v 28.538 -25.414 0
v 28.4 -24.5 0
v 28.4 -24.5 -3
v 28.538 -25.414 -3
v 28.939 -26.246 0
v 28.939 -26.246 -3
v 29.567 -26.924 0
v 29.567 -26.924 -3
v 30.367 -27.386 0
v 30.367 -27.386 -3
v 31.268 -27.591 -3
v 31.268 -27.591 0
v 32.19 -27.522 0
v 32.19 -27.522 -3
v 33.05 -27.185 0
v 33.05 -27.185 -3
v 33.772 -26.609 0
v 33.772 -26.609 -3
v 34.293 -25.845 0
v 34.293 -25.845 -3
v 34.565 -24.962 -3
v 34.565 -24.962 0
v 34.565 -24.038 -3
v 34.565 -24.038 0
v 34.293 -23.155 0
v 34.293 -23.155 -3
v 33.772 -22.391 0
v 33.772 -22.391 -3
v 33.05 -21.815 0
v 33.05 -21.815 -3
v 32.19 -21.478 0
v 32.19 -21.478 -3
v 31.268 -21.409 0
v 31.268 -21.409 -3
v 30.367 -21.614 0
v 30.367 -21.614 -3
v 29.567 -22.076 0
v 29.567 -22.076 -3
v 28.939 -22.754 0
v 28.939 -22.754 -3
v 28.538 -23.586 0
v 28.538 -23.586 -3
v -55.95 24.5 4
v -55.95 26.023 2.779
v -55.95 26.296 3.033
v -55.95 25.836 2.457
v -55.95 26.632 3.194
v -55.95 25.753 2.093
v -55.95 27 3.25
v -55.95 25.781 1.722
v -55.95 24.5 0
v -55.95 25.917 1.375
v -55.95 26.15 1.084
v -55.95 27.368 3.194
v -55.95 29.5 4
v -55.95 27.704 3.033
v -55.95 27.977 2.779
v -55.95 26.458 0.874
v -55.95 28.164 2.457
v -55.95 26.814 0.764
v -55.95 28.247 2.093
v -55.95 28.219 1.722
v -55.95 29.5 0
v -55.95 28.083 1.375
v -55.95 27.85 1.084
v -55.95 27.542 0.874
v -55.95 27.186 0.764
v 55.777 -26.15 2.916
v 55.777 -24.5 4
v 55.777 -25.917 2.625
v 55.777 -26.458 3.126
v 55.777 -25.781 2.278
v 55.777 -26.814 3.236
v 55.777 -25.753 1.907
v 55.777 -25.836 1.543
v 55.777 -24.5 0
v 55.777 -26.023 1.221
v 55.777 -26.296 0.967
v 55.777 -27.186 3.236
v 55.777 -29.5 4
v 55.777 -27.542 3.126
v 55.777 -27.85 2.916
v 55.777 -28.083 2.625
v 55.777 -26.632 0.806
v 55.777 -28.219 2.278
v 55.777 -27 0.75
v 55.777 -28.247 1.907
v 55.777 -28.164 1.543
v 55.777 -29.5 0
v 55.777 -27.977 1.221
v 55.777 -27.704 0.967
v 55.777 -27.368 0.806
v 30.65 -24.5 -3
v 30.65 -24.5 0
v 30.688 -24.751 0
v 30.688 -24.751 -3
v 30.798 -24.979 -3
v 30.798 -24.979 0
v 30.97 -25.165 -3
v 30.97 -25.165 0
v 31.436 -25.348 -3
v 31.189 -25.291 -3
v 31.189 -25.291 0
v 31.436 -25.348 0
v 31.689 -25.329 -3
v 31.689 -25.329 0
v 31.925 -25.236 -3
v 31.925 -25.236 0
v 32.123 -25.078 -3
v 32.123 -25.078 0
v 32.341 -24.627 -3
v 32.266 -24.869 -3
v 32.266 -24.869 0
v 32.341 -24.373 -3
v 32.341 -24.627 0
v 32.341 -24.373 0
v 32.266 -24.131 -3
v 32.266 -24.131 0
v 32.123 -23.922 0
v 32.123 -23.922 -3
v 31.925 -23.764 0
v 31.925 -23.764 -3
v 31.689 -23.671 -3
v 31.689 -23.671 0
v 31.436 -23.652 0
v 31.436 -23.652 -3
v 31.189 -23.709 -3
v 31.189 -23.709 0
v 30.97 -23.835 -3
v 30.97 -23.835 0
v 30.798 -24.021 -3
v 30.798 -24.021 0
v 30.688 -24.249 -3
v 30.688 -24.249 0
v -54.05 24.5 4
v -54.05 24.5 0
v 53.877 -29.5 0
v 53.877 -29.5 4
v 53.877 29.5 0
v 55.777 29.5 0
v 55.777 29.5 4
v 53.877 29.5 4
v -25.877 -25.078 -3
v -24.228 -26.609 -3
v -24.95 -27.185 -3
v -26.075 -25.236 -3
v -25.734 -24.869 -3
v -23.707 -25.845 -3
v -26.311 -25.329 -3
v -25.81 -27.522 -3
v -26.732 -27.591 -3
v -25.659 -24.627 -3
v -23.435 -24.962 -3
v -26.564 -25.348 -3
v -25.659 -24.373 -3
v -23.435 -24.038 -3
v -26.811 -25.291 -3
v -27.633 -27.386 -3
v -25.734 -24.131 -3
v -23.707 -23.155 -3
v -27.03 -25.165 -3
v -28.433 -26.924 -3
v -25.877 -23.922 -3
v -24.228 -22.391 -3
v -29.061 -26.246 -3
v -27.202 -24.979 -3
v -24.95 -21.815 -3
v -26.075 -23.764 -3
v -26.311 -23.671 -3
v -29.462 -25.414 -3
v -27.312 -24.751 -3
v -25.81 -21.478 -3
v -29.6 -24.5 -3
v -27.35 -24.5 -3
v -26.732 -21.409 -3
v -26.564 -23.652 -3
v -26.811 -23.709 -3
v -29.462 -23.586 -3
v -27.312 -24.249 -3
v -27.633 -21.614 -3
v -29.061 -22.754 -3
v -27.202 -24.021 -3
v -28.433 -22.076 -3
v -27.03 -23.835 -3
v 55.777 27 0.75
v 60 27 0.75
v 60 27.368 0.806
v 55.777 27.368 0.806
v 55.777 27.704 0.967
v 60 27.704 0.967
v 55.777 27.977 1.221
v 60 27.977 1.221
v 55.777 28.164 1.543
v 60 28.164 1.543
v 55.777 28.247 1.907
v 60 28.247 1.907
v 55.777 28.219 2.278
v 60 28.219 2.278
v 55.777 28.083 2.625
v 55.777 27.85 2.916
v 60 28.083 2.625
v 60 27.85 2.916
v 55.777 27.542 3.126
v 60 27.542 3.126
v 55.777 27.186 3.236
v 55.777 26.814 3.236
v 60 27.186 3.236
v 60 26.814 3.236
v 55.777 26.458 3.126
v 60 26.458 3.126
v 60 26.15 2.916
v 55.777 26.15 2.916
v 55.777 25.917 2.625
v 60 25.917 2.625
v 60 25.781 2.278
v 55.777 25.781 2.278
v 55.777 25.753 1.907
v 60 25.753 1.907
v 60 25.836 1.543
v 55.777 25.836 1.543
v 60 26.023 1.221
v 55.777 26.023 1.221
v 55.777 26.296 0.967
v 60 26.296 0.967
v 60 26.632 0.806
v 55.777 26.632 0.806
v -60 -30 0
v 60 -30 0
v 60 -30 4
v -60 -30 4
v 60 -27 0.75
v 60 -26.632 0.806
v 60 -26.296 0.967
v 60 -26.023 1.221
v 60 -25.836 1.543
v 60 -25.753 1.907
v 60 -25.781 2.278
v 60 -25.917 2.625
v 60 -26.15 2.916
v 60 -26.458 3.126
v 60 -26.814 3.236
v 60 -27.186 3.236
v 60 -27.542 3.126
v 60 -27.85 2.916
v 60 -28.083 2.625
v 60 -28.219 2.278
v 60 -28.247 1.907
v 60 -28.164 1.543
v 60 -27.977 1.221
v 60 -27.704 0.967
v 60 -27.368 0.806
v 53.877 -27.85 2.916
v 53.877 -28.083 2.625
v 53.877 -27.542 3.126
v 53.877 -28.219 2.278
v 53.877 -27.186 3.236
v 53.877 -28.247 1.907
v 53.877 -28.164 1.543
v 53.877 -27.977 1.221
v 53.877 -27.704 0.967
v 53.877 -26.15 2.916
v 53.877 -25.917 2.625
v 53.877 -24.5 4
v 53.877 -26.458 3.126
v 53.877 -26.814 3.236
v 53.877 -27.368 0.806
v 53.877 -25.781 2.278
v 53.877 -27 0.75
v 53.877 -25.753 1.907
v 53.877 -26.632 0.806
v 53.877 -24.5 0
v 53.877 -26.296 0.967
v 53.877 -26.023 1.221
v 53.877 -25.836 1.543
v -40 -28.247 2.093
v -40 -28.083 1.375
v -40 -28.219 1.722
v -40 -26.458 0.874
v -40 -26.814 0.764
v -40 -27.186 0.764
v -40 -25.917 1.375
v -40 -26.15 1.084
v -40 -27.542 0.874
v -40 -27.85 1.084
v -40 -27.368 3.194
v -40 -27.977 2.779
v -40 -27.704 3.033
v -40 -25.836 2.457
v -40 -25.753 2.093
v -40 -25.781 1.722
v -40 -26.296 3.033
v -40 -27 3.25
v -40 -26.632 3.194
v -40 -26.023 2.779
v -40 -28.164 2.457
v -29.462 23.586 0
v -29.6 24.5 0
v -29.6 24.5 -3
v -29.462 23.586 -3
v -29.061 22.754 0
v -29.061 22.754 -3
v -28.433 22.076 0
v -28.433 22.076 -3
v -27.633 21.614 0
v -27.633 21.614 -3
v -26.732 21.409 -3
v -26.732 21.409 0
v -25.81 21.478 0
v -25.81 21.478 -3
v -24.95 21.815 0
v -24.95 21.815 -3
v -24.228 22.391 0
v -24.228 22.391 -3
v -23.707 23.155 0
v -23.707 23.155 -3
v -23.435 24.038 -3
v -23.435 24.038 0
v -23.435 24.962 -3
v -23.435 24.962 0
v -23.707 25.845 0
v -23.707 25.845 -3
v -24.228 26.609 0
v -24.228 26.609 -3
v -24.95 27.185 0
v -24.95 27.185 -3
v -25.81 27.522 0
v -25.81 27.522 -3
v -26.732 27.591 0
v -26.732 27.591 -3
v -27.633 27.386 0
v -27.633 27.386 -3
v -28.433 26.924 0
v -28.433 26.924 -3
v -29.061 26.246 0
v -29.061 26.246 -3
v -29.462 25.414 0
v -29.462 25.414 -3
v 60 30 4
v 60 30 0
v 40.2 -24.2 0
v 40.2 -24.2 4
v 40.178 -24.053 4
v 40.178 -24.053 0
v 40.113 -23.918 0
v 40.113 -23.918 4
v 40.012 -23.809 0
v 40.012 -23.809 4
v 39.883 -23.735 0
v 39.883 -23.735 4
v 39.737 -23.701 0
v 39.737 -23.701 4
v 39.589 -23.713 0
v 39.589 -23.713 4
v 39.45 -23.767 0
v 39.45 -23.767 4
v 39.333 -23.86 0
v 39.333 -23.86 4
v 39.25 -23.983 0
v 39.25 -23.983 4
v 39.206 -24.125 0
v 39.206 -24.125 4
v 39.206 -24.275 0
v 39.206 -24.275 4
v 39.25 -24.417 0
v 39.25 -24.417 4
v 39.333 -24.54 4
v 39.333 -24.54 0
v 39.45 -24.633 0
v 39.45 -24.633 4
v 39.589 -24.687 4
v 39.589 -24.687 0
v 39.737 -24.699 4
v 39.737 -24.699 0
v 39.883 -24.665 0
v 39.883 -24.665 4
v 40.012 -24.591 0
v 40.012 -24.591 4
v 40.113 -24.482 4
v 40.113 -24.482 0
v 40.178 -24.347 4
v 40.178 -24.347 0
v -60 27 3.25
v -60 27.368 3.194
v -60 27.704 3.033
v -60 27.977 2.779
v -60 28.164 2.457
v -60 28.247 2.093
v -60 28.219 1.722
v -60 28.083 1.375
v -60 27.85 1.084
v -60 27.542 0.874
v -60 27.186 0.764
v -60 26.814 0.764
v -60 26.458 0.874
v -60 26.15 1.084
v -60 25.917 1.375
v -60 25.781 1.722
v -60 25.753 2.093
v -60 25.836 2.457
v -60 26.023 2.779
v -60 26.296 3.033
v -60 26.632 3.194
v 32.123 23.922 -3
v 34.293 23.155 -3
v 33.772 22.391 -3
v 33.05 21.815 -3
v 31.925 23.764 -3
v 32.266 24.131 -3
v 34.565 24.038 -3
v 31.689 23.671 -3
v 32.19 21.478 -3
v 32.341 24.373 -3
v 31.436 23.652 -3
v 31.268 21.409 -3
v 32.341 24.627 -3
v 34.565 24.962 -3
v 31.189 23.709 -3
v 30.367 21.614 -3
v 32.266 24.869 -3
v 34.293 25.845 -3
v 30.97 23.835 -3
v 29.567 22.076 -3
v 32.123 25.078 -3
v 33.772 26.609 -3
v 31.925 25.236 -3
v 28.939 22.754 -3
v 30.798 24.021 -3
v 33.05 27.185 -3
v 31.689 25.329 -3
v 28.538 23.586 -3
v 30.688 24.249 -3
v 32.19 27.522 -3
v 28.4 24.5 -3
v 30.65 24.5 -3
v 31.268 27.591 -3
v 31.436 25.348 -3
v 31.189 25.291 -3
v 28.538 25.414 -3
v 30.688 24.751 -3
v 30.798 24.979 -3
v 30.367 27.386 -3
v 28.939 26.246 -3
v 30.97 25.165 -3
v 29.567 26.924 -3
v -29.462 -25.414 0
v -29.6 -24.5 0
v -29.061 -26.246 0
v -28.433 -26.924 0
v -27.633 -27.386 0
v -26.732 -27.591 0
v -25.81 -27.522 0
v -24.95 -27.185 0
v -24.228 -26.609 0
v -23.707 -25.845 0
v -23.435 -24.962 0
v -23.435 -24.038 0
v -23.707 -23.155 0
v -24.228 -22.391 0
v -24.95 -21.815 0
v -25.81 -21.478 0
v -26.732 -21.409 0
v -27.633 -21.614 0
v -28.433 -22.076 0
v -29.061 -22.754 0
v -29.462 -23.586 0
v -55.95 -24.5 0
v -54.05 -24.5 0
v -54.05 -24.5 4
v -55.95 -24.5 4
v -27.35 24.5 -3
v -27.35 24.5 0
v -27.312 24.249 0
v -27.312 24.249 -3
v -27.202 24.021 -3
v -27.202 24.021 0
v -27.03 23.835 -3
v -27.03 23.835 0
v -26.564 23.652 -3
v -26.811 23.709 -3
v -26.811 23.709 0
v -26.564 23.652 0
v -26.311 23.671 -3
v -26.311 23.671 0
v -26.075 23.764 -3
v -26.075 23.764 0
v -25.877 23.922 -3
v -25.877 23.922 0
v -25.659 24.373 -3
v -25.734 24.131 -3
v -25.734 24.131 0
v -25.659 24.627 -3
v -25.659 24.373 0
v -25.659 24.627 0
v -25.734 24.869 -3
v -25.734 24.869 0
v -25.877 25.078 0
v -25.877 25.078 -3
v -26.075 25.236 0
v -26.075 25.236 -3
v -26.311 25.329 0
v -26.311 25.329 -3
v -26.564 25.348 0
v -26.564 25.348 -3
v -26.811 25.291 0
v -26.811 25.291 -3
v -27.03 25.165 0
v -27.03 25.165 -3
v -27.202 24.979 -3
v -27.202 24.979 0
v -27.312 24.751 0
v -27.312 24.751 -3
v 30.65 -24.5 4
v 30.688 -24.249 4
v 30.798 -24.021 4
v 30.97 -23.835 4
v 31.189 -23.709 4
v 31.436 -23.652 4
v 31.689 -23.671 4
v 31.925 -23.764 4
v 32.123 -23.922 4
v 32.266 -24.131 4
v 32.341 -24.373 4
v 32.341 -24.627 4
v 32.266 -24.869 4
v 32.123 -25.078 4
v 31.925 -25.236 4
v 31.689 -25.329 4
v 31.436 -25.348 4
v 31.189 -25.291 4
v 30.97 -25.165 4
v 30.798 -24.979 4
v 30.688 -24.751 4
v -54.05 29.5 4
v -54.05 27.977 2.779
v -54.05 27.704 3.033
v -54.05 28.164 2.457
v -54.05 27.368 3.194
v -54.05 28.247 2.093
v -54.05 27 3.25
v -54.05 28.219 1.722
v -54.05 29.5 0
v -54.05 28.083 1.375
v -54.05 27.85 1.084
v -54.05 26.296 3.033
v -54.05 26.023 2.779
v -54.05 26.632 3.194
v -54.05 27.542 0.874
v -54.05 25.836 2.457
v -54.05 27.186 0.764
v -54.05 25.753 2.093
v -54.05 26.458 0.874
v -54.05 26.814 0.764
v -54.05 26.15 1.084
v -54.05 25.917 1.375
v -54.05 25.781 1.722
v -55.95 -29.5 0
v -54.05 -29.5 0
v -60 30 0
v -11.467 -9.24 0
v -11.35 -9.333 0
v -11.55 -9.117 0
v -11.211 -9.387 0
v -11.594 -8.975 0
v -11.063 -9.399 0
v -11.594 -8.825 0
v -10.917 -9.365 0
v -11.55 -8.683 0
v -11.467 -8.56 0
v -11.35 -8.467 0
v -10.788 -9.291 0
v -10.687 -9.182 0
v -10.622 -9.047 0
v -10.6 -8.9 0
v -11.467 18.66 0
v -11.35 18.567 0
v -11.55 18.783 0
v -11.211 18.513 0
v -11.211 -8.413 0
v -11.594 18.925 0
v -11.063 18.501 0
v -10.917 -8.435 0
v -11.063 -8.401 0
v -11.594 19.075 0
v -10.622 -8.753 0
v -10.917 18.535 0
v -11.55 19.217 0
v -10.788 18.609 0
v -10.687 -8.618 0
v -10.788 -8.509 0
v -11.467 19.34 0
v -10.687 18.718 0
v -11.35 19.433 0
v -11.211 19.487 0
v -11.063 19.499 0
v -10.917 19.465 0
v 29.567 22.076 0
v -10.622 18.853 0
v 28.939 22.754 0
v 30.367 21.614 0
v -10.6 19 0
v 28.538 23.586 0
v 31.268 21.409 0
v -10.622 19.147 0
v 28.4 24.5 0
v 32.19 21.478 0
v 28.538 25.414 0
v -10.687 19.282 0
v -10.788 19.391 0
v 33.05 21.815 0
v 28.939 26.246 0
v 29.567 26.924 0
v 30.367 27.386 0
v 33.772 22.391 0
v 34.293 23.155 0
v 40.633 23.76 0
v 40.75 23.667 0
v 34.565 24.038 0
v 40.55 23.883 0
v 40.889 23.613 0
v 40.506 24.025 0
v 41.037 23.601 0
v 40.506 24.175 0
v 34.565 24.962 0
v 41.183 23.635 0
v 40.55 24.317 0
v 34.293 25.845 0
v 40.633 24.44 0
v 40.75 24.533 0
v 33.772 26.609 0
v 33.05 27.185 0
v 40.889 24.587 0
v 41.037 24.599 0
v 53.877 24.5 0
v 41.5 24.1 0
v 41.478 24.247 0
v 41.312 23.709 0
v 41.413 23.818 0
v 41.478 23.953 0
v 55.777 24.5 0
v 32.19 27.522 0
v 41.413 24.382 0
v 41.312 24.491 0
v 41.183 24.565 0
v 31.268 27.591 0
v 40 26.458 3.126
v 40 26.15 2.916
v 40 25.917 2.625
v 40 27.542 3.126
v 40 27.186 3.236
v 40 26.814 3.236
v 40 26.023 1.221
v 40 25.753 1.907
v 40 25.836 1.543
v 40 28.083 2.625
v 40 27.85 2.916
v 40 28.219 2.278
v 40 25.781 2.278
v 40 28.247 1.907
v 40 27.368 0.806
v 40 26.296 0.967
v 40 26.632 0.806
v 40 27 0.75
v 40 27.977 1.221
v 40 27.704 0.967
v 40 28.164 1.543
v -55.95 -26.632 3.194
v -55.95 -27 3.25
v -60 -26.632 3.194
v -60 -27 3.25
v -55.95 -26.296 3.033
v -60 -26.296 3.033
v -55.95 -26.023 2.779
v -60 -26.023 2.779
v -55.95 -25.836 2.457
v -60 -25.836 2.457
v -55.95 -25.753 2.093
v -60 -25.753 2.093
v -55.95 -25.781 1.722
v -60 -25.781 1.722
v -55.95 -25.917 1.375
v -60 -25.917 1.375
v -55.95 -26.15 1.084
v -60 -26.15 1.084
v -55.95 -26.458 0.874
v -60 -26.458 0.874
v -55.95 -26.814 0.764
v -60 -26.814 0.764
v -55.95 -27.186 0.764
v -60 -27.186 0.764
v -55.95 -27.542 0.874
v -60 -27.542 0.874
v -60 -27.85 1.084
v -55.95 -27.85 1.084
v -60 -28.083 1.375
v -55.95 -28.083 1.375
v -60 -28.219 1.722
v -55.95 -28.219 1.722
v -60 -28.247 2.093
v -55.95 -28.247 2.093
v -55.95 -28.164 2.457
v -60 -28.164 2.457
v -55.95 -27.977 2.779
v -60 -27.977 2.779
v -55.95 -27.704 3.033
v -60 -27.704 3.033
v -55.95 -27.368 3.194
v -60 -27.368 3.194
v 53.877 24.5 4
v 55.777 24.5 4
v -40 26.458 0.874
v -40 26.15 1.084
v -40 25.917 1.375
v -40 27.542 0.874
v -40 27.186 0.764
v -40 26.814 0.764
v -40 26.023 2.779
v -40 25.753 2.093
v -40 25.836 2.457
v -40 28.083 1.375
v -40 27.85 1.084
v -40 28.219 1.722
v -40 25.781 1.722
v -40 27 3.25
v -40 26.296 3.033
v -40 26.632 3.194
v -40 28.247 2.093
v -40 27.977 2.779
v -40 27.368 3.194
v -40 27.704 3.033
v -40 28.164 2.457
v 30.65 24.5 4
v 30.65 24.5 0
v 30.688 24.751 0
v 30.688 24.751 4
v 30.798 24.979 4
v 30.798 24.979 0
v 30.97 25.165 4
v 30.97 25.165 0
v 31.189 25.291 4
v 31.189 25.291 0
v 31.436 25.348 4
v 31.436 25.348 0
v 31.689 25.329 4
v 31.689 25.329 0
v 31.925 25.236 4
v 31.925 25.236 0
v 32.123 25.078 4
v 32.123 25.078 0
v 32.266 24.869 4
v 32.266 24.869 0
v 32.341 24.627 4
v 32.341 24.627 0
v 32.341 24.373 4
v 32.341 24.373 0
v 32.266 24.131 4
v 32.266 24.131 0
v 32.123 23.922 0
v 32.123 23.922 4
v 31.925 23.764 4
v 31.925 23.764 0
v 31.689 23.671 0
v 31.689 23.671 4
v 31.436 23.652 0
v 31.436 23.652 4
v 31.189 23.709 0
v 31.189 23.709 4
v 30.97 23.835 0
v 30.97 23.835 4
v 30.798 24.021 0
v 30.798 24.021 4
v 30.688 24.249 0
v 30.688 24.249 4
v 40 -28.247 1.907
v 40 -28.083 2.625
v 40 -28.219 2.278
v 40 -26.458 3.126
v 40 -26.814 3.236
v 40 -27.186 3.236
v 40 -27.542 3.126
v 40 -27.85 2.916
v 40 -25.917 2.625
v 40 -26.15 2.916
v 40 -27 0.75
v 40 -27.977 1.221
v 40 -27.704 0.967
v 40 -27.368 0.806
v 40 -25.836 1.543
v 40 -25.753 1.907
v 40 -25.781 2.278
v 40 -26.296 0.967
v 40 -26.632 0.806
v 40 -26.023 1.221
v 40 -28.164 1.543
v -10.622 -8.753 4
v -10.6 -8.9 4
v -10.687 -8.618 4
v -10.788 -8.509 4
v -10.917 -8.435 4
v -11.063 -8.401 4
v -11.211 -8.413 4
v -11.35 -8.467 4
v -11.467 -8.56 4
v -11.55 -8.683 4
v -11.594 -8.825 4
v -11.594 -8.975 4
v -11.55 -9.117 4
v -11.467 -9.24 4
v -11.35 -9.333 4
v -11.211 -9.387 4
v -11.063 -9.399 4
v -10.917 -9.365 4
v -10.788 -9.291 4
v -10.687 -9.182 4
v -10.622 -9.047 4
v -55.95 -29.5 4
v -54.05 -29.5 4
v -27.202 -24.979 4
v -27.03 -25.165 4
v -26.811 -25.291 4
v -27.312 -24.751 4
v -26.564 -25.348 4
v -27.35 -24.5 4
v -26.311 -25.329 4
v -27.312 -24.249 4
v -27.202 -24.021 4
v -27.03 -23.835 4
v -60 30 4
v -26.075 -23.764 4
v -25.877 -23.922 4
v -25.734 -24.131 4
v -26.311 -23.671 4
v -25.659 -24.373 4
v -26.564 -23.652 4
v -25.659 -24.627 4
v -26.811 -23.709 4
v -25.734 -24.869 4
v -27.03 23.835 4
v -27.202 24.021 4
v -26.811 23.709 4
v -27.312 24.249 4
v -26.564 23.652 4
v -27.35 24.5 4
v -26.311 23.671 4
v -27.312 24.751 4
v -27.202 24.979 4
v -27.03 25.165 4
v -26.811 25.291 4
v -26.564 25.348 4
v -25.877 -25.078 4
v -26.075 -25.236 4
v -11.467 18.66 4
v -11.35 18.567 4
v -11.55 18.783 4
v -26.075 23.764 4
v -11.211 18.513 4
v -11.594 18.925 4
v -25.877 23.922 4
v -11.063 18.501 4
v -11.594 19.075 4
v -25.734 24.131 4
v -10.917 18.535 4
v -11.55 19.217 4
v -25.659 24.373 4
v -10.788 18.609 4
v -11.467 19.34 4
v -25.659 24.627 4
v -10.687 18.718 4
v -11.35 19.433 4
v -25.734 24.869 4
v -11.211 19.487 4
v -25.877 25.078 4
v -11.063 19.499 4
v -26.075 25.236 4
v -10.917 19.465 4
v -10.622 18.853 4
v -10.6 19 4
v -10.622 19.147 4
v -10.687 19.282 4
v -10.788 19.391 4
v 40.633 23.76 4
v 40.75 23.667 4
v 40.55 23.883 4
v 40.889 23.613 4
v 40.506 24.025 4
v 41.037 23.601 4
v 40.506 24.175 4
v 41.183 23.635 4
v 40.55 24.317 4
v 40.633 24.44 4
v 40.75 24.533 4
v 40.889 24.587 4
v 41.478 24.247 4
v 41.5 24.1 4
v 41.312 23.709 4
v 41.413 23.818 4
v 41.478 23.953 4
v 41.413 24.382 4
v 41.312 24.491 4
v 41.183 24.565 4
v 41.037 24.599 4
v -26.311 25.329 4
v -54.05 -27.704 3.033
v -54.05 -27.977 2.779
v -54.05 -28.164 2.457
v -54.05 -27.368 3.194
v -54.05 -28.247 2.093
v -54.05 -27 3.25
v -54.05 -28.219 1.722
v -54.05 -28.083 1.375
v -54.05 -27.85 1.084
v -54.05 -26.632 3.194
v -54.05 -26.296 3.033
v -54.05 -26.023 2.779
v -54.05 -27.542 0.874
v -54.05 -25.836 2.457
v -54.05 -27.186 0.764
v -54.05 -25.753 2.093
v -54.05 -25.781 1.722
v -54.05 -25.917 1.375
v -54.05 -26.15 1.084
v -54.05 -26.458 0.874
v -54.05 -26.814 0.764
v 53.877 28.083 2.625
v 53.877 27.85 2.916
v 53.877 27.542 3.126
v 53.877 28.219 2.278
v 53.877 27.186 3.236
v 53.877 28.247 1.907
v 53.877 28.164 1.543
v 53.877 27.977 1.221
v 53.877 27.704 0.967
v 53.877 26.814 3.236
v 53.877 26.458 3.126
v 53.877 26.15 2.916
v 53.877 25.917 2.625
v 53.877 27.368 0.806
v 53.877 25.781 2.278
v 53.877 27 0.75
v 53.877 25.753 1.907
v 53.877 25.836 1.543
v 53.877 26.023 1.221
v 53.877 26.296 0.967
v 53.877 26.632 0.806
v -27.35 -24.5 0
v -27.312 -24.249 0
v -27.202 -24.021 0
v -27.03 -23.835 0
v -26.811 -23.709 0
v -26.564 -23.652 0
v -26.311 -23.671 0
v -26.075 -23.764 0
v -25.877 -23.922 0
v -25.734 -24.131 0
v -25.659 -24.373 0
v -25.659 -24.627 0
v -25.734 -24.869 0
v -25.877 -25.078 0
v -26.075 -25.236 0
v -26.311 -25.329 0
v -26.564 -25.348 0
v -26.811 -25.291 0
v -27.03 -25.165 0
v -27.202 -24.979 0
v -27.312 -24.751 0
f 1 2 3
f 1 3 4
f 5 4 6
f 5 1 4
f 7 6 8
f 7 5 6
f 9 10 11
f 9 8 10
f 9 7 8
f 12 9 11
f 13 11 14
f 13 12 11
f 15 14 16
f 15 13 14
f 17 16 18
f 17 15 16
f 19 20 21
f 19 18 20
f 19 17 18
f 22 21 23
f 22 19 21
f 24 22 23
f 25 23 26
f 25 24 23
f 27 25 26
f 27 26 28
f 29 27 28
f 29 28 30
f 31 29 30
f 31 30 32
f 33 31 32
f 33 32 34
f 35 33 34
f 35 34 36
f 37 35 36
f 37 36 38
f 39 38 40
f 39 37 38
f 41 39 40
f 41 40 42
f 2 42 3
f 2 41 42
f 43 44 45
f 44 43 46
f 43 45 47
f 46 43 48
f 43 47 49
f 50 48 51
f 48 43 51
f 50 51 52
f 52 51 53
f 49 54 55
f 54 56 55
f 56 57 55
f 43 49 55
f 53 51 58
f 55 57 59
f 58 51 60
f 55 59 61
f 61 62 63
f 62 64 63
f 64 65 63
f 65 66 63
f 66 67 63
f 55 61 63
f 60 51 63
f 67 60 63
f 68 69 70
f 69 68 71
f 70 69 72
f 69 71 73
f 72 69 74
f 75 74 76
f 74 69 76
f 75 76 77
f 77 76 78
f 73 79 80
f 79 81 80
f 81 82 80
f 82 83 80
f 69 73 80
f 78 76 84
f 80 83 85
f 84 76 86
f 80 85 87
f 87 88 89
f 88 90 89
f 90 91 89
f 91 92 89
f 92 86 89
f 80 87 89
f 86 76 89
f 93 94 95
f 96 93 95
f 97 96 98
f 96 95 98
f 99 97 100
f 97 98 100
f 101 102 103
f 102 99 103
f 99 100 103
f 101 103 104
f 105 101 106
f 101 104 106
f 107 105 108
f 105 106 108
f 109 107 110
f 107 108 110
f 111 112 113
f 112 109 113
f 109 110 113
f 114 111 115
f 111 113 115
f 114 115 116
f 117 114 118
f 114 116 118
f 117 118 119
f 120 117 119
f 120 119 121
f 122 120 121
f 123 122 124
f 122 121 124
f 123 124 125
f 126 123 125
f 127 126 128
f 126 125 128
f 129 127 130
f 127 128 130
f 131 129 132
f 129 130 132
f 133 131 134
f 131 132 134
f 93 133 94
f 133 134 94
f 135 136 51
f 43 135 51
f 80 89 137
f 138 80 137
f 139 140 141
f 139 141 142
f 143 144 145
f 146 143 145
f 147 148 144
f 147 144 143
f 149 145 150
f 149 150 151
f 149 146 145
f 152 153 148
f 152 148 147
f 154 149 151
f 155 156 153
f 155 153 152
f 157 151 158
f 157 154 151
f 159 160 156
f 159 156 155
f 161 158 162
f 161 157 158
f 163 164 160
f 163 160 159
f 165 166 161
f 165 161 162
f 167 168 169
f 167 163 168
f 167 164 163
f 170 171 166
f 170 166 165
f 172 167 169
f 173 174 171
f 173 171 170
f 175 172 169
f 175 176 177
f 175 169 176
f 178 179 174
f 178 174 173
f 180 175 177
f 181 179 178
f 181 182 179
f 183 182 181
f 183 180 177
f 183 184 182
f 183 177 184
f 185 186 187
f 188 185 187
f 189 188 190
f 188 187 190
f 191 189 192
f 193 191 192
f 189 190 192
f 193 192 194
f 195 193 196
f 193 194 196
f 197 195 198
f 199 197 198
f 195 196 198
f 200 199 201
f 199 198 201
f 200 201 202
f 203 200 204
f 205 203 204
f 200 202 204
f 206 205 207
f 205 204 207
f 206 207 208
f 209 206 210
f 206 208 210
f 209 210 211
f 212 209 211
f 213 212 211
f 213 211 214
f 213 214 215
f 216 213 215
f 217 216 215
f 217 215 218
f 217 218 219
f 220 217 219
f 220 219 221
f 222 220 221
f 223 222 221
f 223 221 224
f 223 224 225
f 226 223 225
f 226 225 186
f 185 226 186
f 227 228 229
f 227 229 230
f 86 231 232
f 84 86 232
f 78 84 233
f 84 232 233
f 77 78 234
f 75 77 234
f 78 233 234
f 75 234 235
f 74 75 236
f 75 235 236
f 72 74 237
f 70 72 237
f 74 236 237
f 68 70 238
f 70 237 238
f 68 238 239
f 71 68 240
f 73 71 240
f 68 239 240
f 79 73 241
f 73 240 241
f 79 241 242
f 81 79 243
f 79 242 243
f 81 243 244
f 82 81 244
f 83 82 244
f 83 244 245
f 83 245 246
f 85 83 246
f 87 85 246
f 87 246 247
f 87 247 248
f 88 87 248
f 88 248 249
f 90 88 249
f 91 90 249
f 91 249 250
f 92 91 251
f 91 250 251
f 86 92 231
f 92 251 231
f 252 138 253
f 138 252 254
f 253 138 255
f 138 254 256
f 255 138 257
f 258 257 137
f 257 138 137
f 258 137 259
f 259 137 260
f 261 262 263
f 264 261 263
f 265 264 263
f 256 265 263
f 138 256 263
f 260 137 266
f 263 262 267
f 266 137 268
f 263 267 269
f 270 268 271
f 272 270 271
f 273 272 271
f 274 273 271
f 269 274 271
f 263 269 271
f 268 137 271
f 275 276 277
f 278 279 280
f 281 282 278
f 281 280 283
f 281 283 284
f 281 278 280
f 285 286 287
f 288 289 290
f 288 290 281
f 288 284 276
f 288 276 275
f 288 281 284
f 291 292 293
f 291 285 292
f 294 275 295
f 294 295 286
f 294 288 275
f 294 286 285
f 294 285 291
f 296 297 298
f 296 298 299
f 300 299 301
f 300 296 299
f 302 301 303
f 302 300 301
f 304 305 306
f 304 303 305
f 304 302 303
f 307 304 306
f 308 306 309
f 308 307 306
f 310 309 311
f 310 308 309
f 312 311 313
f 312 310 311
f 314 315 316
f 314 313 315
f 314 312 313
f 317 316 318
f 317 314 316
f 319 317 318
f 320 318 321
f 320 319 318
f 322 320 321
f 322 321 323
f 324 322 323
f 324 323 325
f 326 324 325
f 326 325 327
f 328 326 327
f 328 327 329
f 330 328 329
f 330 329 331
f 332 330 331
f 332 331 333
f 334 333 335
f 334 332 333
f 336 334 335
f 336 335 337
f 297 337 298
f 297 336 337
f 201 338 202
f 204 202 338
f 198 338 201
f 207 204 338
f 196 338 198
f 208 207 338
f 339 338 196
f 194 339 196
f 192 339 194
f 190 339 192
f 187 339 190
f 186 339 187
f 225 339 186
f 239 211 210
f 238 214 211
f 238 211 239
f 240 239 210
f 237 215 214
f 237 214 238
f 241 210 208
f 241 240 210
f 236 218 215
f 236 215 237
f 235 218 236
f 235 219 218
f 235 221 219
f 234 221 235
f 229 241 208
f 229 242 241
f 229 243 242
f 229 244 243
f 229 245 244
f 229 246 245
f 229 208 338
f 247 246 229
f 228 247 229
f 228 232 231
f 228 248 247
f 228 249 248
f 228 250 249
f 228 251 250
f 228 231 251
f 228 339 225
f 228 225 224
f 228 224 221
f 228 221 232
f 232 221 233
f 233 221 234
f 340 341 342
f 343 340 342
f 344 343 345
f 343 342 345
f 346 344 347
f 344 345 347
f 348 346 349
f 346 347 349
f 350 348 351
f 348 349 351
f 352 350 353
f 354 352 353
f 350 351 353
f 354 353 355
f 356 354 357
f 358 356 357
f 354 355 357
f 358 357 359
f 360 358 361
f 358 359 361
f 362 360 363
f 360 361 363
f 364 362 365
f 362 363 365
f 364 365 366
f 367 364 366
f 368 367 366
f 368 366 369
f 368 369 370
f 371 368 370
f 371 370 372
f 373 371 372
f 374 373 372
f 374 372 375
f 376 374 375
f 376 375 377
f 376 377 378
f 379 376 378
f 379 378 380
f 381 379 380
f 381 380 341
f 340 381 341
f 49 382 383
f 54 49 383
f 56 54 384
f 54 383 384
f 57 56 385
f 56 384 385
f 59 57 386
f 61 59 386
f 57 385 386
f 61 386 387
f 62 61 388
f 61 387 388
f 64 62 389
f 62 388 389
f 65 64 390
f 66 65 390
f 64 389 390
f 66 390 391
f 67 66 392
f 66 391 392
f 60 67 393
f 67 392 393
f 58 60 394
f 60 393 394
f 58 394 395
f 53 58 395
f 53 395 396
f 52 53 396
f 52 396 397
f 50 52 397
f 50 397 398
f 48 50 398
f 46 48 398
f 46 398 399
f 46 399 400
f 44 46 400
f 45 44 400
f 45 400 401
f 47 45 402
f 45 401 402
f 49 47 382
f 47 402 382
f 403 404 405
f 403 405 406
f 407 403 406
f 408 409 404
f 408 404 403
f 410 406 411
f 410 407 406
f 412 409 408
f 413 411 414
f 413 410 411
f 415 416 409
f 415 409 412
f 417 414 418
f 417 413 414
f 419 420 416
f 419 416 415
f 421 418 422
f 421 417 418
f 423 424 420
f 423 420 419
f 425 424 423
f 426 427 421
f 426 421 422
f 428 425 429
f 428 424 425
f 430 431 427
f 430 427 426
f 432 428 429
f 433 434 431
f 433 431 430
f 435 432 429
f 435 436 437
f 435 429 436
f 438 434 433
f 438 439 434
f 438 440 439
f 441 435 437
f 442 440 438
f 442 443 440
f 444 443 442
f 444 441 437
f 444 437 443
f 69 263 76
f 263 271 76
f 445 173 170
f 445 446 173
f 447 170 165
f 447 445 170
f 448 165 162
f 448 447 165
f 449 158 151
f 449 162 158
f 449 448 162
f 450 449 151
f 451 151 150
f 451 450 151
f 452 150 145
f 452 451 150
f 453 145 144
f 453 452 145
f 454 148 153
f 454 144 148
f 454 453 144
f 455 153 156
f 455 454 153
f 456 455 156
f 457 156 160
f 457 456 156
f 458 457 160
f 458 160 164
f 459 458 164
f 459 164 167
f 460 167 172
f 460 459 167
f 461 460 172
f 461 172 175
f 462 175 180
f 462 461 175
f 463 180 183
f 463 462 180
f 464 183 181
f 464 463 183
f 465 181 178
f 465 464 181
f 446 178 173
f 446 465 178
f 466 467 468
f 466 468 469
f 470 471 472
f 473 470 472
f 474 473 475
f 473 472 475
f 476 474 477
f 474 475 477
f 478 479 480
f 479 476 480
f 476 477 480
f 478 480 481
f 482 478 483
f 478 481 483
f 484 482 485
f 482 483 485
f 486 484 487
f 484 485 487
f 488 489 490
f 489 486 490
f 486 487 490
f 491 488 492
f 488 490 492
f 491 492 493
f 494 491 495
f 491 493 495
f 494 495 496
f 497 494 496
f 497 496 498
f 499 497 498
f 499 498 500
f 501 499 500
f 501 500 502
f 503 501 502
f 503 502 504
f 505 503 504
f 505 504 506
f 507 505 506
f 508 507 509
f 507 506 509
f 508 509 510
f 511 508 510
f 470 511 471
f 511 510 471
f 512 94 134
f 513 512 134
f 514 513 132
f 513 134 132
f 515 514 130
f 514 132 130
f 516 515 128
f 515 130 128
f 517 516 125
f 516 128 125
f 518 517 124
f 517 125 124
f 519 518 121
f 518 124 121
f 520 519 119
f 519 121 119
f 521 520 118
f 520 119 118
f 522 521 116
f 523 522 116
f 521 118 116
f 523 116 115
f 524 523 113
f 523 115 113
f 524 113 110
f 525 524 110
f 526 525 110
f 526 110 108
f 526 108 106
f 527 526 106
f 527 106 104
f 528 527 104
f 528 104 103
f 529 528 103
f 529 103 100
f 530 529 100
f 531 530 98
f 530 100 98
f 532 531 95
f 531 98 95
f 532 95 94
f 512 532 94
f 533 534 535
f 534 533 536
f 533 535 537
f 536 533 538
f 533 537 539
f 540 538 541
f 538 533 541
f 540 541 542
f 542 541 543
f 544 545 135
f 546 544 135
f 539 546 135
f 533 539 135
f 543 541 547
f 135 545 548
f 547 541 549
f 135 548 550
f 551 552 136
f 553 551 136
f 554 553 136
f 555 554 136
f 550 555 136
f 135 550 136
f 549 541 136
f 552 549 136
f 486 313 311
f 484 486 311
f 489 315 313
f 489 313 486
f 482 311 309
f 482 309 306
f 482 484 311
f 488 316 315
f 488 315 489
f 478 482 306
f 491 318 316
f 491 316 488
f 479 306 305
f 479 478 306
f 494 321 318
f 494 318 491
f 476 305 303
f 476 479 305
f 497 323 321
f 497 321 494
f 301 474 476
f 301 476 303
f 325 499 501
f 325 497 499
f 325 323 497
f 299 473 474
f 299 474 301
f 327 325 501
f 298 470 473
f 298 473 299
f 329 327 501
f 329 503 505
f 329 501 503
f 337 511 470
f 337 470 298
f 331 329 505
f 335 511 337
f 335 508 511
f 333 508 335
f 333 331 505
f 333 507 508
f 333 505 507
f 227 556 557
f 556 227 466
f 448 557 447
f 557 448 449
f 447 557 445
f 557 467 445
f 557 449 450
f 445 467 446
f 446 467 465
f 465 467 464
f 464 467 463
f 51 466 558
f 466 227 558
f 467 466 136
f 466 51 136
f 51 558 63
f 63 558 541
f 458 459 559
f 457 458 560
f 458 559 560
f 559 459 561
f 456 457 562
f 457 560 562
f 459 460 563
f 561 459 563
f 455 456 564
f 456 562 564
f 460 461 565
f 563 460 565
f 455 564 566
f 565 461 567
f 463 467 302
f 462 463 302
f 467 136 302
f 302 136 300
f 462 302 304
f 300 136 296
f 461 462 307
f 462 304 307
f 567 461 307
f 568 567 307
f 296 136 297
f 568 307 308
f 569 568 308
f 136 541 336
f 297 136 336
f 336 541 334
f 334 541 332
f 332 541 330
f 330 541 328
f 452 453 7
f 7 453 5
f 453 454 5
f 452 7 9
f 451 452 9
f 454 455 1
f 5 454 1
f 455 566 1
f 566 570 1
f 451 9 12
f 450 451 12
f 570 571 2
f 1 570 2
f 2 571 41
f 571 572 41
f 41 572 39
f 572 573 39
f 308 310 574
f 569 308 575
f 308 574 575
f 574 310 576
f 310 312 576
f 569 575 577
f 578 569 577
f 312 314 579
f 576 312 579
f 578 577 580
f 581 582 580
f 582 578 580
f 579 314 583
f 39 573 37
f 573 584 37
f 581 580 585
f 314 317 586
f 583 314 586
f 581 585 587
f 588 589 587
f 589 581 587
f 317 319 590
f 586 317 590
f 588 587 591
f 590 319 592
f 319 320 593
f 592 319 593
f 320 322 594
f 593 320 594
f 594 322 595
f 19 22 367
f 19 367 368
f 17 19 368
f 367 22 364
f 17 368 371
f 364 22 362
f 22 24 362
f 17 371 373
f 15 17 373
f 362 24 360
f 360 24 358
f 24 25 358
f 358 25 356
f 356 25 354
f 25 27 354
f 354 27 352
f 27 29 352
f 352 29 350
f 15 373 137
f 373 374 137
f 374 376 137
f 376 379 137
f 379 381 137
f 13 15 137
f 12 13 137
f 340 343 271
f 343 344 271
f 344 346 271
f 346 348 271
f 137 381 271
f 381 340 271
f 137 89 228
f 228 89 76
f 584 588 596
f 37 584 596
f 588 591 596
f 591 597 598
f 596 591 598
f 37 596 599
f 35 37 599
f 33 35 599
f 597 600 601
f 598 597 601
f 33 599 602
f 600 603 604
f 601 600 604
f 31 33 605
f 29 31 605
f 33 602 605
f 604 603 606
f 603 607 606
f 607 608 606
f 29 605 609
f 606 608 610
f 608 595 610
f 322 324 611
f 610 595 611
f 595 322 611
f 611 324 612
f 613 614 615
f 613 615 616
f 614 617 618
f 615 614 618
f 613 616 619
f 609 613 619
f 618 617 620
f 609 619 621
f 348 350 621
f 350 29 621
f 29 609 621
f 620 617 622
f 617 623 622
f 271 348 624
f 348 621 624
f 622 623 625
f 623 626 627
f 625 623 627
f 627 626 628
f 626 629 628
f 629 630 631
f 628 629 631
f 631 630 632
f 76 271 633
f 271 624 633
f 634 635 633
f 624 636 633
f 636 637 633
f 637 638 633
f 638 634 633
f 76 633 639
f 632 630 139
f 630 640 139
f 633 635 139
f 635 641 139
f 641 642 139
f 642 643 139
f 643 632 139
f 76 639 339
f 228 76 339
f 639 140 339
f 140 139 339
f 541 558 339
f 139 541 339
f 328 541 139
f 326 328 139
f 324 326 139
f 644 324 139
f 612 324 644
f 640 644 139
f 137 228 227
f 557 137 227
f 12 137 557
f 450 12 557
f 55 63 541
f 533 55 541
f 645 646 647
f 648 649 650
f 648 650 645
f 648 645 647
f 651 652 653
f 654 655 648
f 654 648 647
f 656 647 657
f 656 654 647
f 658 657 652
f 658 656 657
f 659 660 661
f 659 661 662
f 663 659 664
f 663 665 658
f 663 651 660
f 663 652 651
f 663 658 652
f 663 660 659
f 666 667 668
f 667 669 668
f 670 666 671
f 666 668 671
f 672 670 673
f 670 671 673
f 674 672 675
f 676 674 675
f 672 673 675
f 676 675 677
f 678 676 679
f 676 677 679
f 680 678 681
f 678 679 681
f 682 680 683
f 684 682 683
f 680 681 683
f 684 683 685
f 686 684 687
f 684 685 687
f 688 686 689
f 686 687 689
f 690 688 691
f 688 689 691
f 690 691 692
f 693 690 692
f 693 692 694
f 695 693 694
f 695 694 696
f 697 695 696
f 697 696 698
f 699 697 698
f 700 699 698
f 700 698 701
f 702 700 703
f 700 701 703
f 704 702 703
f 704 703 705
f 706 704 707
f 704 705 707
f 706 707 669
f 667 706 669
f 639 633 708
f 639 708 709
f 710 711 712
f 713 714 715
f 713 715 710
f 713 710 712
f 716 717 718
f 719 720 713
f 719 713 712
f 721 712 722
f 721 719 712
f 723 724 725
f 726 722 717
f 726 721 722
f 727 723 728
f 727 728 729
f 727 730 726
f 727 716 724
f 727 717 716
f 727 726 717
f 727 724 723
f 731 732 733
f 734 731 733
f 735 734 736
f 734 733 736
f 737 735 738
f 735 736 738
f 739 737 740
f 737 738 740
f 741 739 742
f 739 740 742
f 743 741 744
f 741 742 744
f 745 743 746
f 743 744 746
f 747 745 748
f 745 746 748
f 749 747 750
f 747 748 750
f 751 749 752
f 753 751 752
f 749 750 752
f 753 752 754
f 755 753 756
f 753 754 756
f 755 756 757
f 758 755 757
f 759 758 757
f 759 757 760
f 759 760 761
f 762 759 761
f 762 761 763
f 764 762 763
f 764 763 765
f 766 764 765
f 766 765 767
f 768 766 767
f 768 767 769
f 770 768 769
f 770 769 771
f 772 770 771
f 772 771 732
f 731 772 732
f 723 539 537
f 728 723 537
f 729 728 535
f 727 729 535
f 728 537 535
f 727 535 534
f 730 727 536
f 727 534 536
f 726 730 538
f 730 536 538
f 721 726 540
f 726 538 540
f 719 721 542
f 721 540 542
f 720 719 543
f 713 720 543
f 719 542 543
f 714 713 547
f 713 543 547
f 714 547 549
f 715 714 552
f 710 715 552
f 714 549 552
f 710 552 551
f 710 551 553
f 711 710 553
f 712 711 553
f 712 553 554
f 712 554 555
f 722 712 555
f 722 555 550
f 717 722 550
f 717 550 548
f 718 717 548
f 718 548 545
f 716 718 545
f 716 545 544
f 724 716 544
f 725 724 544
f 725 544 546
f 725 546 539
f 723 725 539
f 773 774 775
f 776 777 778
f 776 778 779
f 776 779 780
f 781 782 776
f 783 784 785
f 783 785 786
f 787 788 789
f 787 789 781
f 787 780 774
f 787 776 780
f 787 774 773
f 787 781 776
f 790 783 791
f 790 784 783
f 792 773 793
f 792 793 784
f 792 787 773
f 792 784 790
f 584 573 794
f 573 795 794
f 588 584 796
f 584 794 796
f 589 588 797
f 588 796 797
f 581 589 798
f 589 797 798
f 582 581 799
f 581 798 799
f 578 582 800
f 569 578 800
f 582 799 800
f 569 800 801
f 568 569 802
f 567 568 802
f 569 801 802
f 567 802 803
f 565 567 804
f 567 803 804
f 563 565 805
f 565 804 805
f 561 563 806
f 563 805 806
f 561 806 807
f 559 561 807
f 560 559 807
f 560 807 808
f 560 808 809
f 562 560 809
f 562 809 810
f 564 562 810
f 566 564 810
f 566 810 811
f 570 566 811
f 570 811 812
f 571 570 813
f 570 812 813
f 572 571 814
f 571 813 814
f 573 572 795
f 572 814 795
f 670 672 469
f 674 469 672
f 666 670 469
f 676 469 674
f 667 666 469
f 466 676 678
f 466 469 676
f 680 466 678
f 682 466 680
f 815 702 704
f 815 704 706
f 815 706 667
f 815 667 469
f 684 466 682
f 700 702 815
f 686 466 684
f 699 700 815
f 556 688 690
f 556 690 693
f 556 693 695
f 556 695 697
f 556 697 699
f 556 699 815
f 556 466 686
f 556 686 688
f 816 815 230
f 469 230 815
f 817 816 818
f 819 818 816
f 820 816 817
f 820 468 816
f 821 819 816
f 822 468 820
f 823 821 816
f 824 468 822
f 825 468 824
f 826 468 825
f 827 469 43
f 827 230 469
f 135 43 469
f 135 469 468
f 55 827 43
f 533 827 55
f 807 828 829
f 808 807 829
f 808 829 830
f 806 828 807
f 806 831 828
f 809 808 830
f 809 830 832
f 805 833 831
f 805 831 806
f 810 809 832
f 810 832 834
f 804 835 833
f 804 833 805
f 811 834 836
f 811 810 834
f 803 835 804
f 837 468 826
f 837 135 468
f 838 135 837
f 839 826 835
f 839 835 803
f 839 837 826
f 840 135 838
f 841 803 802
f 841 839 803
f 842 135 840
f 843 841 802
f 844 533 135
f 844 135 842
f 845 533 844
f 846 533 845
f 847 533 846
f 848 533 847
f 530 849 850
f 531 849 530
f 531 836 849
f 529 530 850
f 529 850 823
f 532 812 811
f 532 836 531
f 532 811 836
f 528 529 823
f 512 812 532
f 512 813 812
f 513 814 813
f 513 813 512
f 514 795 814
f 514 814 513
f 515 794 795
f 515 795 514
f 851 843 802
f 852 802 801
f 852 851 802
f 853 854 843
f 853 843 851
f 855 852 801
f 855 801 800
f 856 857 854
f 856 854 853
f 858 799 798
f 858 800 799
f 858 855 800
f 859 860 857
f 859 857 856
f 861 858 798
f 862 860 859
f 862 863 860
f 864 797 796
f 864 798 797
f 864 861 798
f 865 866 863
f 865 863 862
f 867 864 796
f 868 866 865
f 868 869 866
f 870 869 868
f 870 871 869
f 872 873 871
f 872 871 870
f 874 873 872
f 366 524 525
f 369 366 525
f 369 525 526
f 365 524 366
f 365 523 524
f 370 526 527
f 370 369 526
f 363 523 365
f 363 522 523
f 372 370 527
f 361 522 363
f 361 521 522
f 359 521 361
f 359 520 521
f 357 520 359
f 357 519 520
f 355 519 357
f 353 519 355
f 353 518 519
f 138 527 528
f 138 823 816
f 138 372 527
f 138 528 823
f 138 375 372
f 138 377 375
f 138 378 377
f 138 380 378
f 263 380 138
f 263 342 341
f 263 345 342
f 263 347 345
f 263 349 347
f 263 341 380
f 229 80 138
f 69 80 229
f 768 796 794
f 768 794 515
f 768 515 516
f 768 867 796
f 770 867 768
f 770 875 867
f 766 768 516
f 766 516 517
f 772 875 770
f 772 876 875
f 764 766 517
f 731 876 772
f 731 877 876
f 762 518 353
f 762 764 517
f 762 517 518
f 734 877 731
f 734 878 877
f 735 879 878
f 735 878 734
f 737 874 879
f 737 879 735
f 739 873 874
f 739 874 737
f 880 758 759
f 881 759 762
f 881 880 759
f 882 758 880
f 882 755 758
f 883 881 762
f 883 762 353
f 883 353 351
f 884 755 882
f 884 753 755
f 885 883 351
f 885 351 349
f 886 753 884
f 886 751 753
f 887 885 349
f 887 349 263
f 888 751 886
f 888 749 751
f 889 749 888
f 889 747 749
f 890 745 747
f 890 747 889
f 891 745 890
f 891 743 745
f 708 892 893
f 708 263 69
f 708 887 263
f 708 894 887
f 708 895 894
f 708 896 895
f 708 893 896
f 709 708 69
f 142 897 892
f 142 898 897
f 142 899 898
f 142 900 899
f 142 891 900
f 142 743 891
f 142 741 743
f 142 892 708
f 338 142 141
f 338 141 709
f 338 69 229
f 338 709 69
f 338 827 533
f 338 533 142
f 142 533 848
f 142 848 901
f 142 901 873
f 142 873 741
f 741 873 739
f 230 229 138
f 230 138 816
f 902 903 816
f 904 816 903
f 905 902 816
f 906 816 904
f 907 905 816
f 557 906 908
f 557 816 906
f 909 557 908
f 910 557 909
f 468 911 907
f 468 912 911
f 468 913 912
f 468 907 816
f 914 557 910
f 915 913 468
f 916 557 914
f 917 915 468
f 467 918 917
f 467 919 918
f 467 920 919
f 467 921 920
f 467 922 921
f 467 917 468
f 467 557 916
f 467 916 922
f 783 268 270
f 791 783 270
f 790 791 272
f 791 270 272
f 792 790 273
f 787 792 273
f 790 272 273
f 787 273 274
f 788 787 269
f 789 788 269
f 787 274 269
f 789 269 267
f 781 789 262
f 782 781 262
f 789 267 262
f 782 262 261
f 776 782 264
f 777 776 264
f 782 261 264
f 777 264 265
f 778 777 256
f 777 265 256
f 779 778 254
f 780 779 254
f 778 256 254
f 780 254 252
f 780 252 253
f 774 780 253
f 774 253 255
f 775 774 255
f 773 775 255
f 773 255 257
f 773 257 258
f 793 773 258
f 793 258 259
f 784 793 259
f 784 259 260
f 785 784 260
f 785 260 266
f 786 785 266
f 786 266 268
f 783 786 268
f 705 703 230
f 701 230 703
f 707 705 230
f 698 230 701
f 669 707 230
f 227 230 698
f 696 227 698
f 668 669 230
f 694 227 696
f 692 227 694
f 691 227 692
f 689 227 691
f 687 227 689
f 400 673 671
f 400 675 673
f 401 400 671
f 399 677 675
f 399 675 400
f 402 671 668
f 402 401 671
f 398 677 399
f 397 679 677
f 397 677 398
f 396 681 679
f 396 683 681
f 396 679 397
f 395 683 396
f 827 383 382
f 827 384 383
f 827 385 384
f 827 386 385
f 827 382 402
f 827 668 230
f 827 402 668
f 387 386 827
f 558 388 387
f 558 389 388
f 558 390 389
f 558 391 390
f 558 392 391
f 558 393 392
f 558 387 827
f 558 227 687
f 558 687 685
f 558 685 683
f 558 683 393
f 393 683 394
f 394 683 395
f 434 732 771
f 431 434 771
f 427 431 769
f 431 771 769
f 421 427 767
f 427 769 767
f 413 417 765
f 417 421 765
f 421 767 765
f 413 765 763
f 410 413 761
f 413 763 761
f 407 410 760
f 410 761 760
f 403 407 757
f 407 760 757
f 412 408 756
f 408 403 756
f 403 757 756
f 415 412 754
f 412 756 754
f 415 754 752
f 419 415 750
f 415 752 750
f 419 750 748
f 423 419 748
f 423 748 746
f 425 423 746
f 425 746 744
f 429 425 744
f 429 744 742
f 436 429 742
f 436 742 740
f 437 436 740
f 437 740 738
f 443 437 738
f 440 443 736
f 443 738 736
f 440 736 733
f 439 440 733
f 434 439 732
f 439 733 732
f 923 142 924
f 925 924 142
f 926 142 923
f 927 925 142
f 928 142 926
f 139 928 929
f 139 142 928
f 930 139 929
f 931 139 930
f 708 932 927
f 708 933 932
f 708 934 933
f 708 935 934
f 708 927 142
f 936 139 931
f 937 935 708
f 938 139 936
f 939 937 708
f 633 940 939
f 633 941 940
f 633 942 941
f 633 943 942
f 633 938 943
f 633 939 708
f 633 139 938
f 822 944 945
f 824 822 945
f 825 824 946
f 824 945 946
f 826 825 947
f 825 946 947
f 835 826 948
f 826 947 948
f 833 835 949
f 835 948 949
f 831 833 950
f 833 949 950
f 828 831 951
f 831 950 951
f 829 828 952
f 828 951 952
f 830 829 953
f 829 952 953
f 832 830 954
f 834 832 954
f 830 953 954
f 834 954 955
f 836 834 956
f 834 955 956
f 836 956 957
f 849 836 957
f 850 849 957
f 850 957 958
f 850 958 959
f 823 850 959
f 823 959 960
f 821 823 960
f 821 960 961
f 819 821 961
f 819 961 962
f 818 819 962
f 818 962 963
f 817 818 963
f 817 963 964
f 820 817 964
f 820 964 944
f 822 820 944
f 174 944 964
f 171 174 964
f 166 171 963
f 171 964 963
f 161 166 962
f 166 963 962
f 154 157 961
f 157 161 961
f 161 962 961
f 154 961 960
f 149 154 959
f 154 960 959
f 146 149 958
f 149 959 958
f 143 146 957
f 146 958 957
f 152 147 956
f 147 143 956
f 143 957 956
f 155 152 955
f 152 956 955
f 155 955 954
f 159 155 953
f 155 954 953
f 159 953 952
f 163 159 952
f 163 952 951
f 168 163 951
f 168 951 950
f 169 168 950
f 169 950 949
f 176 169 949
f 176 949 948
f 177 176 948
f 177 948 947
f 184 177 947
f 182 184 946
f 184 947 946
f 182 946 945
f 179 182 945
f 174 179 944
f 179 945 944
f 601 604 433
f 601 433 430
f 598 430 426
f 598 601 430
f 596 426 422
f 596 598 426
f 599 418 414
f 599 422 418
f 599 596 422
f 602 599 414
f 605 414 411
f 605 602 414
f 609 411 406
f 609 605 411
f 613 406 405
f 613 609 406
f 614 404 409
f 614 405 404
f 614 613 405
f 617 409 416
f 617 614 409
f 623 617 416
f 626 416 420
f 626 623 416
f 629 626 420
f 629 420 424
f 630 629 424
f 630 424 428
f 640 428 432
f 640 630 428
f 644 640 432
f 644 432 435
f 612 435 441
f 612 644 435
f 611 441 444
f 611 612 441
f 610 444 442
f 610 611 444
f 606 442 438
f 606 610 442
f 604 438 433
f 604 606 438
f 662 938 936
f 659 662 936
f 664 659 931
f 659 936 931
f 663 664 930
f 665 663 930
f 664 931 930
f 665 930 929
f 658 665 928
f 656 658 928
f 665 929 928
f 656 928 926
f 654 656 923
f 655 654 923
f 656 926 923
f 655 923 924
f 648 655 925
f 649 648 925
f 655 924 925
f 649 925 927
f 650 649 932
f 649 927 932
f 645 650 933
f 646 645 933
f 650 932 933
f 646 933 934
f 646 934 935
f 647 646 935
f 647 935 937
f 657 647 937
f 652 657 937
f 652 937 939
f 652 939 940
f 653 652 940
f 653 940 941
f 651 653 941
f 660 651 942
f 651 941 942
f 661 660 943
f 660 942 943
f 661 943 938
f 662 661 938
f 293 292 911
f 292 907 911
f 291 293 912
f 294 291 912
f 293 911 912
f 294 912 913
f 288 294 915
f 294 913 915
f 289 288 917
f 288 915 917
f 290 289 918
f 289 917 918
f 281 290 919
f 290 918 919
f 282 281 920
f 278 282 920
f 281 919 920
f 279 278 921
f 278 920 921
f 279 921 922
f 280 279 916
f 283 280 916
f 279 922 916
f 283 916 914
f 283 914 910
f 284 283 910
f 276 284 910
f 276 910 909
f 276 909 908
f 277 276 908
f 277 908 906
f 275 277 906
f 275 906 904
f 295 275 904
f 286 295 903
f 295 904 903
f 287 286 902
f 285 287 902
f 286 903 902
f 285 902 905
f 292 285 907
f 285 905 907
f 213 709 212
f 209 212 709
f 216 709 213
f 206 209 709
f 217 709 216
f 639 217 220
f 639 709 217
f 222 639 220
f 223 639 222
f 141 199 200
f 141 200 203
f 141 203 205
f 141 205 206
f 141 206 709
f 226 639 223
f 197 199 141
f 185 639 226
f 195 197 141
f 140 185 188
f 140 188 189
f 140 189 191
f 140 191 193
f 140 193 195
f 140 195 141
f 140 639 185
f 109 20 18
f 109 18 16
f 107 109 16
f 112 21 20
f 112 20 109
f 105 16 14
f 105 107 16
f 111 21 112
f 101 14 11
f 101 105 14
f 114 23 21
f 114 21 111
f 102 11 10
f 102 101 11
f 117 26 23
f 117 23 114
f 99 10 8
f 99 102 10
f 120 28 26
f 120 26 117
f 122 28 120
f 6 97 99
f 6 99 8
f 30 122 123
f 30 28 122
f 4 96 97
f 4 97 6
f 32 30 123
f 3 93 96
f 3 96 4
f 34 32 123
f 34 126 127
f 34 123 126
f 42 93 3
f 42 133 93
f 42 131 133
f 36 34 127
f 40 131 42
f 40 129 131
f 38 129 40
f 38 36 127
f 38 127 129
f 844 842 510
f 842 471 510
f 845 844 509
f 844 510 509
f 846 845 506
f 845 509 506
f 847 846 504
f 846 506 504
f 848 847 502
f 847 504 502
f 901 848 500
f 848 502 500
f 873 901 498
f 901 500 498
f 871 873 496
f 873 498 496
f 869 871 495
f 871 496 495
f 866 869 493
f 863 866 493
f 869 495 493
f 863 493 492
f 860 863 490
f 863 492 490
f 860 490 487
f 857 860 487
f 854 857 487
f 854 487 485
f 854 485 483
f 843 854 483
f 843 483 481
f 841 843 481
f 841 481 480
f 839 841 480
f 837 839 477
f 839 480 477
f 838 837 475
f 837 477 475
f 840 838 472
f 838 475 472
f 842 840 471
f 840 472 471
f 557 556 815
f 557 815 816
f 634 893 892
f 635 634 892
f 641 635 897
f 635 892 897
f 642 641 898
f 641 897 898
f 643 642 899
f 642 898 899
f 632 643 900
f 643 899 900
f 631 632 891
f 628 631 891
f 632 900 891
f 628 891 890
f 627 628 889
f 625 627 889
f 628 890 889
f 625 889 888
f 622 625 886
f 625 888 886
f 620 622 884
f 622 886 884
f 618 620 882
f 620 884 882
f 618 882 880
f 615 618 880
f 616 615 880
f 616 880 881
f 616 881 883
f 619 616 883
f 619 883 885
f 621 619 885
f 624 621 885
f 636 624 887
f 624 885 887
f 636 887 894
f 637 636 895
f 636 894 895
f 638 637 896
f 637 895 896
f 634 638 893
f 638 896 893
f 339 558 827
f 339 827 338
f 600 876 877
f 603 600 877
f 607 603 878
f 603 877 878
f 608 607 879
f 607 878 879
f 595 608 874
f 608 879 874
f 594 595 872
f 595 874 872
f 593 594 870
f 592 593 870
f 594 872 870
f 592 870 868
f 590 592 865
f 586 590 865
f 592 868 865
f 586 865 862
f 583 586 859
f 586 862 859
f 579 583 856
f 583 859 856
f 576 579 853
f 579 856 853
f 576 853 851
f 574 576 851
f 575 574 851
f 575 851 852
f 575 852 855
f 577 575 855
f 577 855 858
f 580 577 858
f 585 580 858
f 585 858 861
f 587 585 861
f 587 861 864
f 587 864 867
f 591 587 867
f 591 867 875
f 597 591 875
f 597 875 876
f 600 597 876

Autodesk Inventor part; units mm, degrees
ref_plane "YZ Plane" through (0, 0, 0) normal (1, 0, 0) x (0, 1, 0)
ref_plane "XZ Plane" through (0, 0, 0) normal (0, 1, 0) x (-1, 0, 0)
ref_plane "XY Plane" through (0, 0, 0) normal (0, 0, 1) x (1, 0, 0)
sketch "Sketch1" plane through (0, 0, 0) normal (0, 0, 1) x (1, 0, 0)
  line L0 (-60, 30) -> (60, 30)
  line L1 (60, 30) -> (60, -30)
  line L2 (60, -30) -> (-60, -30)
  line L3 (-60, -30) -> (-60, 30)
  line L4 (-60, 30) -> (60, -30) construction
  line L5 (60, 30) -> (-60, -30) construction
  line L6 (-60, 24) -> (60, 24) construction
  line L7 (60, 24) -> (60, -24) construction
  line L8 (60, -24) -> (-60, -24) construction
  line L9 (-60, -24) -> (-60, 24) construction
  line L10 (-60, 24) -> (60, -24) construction
  line L11 (60, 24) -> (-60, -24) construction
  line L12 (-59.6915, 27) -> (60.3085, 27) construction
  line L13 (59.9134, -27) -> (-60.0866, -27) construction
  line L14 (-55, 34.9894) -> (-55, -41.0431) construction
  line L15 (55, 34.9894) -> (55, -41.0431) construction
  line L16 (-0.0866, 42.6852) -> (-0.0866, -44.8416)
  line L17 (-70.7157, 0) -> (86.0605, 0)
  line L18 (-55.95, 29.5) -> (-54.05, 29.5)
  line L19 (-54.05, 29.5) -> (-54.05, 24.5)
  line L20 (-54.05, 24.5) -> (-55.95, 24.5)
  line L21 (-55.95, 24.5) -> (-55.95, 29.5)
  line L22 (-55.95, 29.5) -> (-54.05, 24.5) construction
  line L23 (-54.05, 29.5) -> (-55.95, 24.5) construction
  line L24 (55.7768, 29.5) -> (53.8768, 29.5)
  line L25 (53.8768, 29.5) -> (53.8768, 24.5)
  line L26 (53.8768, 24.5) -> (55.7768, 24.5)
  line L27 (55.7768, 24.5) -> (55.7768, 29.5)
  line L28 (55.7768, 29.5) -> (53.8768, 24.5) construction
  line L29 (53.8768, 29.5) -> (55.7768, 24.5) construction
  line L30 (-55.95, -29.5) -> (-54.05, -29.5)
  line L31 (-54.05, -29.5) -> (-54.05, -24.5)
  line L32 (-54.05, -24.5) -> (-55.95, -24.5)
  line L33 (-55.95, -24.5) -> (-55.95, -29.5)
  line L34 (-55.95, -29.5) -> (-54.05, -24.5) construction
  line L35 (-54.05, -29.5) -> (-55.95, -24.5) construction
  line L36 (53.8768, -29.5) -> (53.8768, -24.5)
  line L37 (53.8768, -24.5) -> (55.7768, -24.5)
  line L38 (55.7768, -24.5) -> (55.7768, -29.5)
  line L39 (55.7768, -29.5) -> (53.8768, -24.5) construction
  line L40 (53.8768, -29.5) -> (55.7768, -24.5) construction
  line L41 (55.7768, -29.5) -> (53.8768, -29.5)
  point P0 (0, 0)
  point P1 (-55, 27)
  point P2 (54.8268, 27)
  point P3 (-55, -27)
  point P4 (54.8268, -27)
  dimension "d0" = 120
  dimension "d1" = 60
  dimension "d5" = 48
  dimension "d6" = 6
  dimension "d7" = 3
  dimension "d9" = 3
  dimension "d10" = 5
  dimension "d11" = 5
  dimension "d26" = 1.9
  dimension "d27" = 5
extrude "Extrusion1" add sketch "Sketch1" along normal blind 4 contours L0 L16 L17 L3 | L0 L1 L17 L16 | L17 L16 L2 L3 | L17 L1 L2 L16 | L18 L19 L20 L21 | L27 L26 L25 L24 | L33 L32 L31 L30 | L36 L37 L38 L41
sketch "Sketch2" plane through (60, -30, 0) normal (1, 0, 0) x (0, 0, -1)
  line L0 (-8.9857, 57) -> (8.9833, 57) construction
  line L1 (0, 60) -> (-4, 60) projected
  line L2 (-2, 63.5324) -> (-2, -21.5348) construction
  line L3 (0, 60) -> (0, 0) construction
  line L4 (-7.253, 3) -> (5.1126, 3) construction
  line L5 (0, 0) -> (-4, 0) construction
  circle A0 centre (-2, 57) radius 1.25
  circle A1 centre (-2, 3) radius 1.25
  point P0 (0, 30)
  dimension "d12" = 3
  dimension "d13" = 2
  dimension "d14" = 3
  dimension "d15" = 2.5
  dimension "d16" = 2.5
extrude "Extrusion2" cut sketch "Sketch2" against normal blind 20
sketch "Sketch3" plane through (-60, -30, 0) normal (-1, 0, 0) x (0, 0, 1)
  line L0 (-7.4279, 57) -> (13.0105, 57) construction
  line L1 (2, 62.779) -> (2, -22.3608) construction
  line L2 (-5.3723, 3) -> (8.7736, 3) construction
  line L3 (0, 60) -> (4, 60) construction
  line L4 (0, 0) -> (4, 0) construction
  line L5 (0, 0) -> (0, 60) construction
  circle A0 centre (2, 57) radius 1.25
  circle A1 centre (2, 3) radius 1.25
  point P0 (0, 30)
  dimension "d19" = 3
  dimension "d20" = 3
  dimension "d21" = 2
  dimension "d22" = 2.5
  dimension "d23" = 2.5
extrude "Extrusion3" cut sketch "Sketch3" against normal blind 20
extrude "Extrusion4" cut sketch "Sketch1" along normal blind 10 contours L18 L19 L20 L21 | L27 L26 L25 L24 | L33 L32 L31 L30 | L36 L37 L38 L41
sketch "Sketch5" plane through (0, 0, 0) normal (0, 0, -1) x (-1, 0, 0)
  line L0 (-55, 28) -> (30, 28) construction
  line L1 (30, 28) -> (30, -28) construction
  line L2 (30, -28) -> (-55, -28) construction
  line L3 (-55, -28) -> (-55, 28) construction
  line L4 (60, 30) -> (-60, 30) projected
  line L5 (-60, -30) -> (60, -30) projected
  line L6 (-60, 30) -> (-60, -30) projected
  line L7 (-61.4504, 24.5) -> (34.2975, 24.5) construction
  line L8 (-31.5, 29.0313) -> (-31.5, -33.267) construction
  line L9 (26.5, 28.5391) -> (26.5, -33.7592) construction
  line L10 (-62.9373, -24.5) -> (32.8105, -24.5) construction
  circle A0 centre (-31.5, 24.5) radius 3.1
  circle A1 centre (26.5, 24.5) radius 3.1
  circle A2 centre (-31.5, -24.5) radius 3.1
  circle A3 centre (26.5, -24.5) radius 3.1
  circle A4 centre (-31.5, 24.5) radius 0.85
  circle A5 centre (26.5, 24.5) radius 0.85
  circle A6 centre (-31.5, -24.5) radius 0.85
  circle A7 centre (26.5, -24.5) radius 0.85
  point P0 (0, 0)
  dimension "d32" = 2
  dimension "d35" = 56
  dimension "d36" = 60
  dimension "d37" = 85
  dimension "d38" = 5
  dimension "d39" = 3.5
  dimension "d40" = 3.5
  dimension "d41" = 3.5
  dimension "d42" = 58
  dimension "d43" = 6.2
  dimension "d44" = 6.2
  dimension "d45" = 6.2
  dimension "d46" = 6.2
  dimension "d47" = 1.7
  dimension "d48" = 1.7
  dimension "d49" = 1.7
  dimension "d50" = 1.7
extrude "Extrusion6" add sketch "Sketch5" along normal blind 3
extrude "Extrusion8" cut sketch "Sketch5" against normal blind 5 contours A4 | A5 | A6 | A7
sketch "Sketch6" plane through (0, 0, 4) normal (0, 0, 1) x (1, 0, 0)
  line L0 (55, -26.7) -> (-13.6, -26.7) construction
  line L1 (-13.6, -26.7) -> (-13.6, 26.6) construction
  line L2 (-13.6, 26.6) -> (55, 26.6) construction
  line L3 (55, 26.6) -> (55, -26.7) construction
  line L4 (60, -30) -> (60, 30) projected
  line L5 (-60, -30) -> (60, -30) projected
  line L6 (60, 30) -> (-60, 30) projected
  line L7 (-11.1, 28.3746) -> (-11.1, -43.0952) construction
  line L8 (41, 27.7316) -> (41, -43.7382) construction
  line L9 (39.7, 28.5262) -> (39.7, -42.9435) construction
  line L10 (-16.1238, 24.1) -> (57.2628, 24.1) construction
  line L11 (-13.8231, 19) -> (59.5635, 19) construction
  line L12 (-15.4929, -8.9) -> (57.8937, -8.9) construction
  line L13 (-14.4245, -24.2) -> (58.9621, -24.2) construction
  circle A0 centre (-11.1, 19) radius 0.5
  circle A1 centre (-11.1, -8.9) radius 0.5
  circle A2 centre (41, 24.1) radius 0.5
  circle A3 centre (39.7, -24.2) radius 0.5
  point P0 (0, 0)
  dimension "d57" = 53.3
  dimension "d58" = 68.6
  dimension "d59" = 5
  dimension "d60" = 3.3
  dimension "d61" = 3.4
  dimension "d62" = 2.5
  dimension "d63" = 2.5
  dimension "d64" = 14
  dimension "d65" = 1.3
  dimension "d66" = 50.8
  dimension "d68" = 27.9
  dimension "d69" = 5.1
  dimension "d70" = 35.5
  dimension "d71" = 1
  dimension "d72" = 1
  dimension "d73" = 1
  dimension "d74" = 1
extrude "Extrusion9" cut sketch "Sketch6" against normal blind 5
properties part number "Boardcarrier"
